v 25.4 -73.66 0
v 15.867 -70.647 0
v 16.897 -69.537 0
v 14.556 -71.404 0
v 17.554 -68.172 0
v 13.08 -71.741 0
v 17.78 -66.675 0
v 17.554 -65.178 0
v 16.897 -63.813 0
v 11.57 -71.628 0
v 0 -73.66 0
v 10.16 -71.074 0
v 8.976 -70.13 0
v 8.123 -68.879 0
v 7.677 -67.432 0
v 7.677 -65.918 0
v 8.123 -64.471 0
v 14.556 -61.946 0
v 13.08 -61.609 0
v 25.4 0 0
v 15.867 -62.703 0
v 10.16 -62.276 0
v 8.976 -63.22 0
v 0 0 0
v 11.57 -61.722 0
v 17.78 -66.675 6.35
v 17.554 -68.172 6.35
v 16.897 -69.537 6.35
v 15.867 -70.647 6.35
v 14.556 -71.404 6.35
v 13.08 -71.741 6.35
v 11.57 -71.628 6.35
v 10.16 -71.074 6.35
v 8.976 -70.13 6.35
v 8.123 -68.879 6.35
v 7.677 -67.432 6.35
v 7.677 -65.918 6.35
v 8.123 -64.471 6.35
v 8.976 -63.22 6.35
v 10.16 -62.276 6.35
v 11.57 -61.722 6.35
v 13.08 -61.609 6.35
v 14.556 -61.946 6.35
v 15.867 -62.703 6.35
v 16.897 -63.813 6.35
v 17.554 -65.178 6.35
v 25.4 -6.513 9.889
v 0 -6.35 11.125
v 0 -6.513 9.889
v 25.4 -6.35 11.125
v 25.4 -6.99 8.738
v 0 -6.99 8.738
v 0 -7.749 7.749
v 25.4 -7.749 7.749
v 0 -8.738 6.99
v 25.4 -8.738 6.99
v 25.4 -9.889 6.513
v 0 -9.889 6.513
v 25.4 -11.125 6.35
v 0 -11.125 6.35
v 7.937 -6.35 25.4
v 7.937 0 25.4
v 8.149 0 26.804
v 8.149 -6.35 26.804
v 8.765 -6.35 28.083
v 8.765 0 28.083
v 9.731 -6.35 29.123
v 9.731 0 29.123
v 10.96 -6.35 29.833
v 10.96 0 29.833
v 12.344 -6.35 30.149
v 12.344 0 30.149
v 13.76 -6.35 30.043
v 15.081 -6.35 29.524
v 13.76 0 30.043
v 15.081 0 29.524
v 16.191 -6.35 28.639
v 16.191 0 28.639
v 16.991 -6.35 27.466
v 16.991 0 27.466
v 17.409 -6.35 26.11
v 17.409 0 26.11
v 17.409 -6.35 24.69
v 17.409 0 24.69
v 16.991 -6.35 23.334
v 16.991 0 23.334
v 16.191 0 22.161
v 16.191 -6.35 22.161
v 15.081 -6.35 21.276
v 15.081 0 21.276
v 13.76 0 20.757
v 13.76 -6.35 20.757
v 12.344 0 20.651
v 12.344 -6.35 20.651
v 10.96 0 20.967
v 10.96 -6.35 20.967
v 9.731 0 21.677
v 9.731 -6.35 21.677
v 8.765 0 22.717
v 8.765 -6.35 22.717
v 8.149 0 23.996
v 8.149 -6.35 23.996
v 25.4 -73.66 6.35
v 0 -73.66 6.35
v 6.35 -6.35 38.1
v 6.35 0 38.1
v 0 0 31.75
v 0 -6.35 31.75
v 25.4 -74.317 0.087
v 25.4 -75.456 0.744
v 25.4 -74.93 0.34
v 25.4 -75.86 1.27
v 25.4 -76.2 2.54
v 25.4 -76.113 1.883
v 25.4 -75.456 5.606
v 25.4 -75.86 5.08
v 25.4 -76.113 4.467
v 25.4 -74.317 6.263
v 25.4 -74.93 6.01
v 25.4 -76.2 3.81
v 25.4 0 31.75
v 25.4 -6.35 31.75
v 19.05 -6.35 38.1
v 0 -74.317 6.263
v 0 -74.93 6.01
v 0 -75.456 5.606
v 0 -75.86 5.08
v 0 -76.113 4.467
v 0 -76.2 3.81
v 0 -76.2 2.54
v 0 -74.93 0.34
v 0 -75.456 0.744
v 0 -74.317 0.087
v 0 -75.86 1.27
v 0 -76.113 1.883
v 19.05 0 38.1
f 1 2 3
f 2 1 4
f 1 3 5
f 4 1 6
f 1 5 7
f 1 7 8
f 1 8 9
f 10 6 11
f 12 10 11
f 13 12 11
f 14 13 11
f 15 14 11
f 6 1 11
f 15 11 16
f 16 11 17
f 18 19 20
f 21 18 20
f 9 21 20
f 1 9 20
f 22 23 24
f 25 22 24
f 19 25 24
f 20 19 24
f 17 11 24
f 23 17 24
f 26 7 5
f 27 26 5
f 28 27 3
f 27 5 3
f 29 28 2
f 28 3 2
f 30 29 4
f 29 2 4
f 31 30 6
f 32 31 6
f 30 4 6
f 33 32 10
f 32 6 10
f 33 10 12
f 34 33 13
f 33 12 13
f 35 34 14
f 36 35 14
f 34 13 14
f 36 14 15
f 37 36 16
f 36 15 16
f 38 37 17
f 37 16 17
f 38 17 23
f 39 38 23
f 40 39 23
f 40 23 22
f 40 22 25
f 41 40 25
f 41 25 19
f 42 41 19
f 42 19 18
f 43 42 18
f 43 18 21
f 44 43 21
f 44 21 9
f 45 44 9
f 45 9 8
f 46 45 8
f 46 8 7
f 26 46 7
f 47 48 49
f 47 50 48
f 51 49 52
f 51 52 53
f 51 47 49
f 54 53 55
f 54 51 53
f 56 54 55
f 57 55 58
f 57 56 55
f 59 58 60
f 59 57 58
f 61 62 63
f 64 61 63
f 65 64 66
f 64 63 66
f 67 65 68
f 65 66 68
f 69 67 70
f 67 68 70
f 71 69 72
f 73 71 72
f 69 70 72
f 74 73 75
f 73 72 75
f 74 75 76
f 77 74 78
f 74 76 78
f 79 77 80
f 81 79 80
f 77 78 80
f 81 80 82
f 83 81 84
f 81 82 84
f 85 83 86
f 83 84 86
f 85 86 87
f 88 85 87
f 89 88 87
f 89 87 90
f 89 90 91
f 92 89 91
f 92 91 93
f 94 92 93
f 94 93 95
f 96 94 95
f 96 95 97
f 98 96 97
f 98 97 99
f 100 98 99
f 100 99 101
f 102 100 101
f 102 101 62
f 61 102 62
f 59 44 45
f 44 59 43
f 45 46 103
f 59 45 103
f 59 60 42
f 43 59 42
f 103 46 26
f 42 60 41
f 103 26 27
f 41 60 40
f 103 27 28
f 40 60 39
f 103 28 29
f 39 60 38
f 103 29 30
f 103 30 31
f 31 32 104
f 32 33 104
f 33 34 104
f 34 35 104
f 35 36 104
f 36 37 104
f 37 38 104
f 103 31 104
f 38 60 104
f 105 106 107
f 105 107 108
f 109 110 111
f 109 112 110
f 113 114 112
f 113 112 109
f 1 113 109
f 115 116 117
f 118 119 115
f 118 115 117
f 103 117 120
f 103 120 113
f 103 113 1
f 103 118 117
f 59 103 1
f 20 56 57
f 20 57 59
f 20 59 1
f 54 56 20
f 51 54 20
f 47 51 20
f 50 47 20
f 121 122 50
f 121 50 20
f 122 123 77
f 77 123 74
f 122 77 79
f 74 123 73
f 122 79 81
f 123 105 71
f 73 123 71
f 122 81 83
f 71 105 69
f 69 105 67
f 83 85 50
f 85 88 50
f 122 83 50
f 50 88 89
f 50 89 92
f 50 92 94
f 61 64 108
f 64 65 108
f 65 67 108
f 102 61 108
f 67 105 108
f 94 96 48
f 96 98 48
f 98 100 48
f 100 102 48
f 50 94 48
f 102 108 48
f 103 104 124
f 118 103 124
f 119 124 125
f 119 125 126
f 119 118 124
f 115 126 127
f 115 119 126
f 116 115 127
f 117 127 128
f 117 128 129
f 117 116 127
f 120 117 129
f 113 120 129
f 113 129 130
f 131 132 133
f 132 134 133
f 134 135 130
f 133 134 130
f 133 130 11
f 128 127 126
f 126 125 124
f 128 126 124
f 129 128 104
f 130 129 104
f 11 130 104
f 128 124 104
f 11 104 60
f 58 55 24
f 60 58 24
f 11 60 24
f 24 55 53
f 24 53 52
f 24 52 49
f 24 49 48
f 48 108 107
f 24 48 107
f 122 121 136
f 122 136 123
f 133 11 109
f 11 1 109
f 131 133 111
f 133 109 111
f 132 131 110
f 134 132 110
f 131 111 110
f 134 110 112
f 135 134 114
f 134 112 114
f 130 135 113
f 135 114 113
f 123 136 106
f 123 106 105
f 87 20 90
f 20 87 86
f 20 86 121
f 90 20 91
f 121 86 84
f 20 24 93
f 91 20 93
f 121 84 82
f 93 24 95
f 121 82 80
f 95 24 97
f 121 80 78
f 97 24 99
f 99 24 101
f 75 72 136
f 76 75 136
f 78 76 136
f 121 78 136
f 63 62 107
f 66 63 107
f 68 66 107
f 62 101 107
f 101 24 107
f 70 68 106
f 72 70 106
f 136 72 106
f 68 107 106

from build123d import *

# Parameters (mm, degrees)
F1_DEPTH = 25.4
F2_R     = 4.7752
F3_R     = 4.7625
F4_DEPTH = 25.4
F5_SIZE  = 6.35
F6_R     = 5.08
F7_DEPTH = 25.4
F8_R     = 2.54


with BuildPart() as f1:
    # F0 (on Right) → F1 (new body)
    with BuildSketch(Plane.YZ):
        Polygon((-76.2, 0), (0, 0), (0, 38.1), (-6.35, 38.1), (-6.35, 6.35), (-76.2, 6.35), align=None)
    extrude(amount=F1_DEPTH)

    # F2
    f2_edges = [f1.edges().sort_by_distance(p)[0] for p in [
        (12.7, -6.35, 6.35),
    ]]
    fillet(f2_edges, radius=F2_R)

    # F3 (on face) → F4 (cut)
    with BuildSketch(Plane(origin=(0, 0, 0), x_dir=(-1, 0, 0), z_dir=(0, 1, 0))):
        with Locations((-12.7, 25.4)):
            Circle(F3_R)
    extrude(amount=-F4_DEPTH, mode=Mode.SUBTRACT)

    # F5
    f5_edges = [f1.edges().sort_by_distance(p)[0] for p in [
        (25.4, -3.175, 38.1),
        (0, -3.175, 38.1),
    ]]
    chamfer(f5_edges, length=F5_SIZE)

    # F6 (on face) → F7 (cut)
    with BuildSketch(Plane(origin=(0, 0, 0), x_dir=(1, 0, 0), z_dir=(0, 0, -1))):
        with Locations((12.7, 66.675)):
            Circle(F6_R)
    extrude(amount=-F7_DEPTH, mode=Mode.SUBTRACT)

    # F8
    f8_edges = [f1.edges().sort_by_distance(p)[0] for p in [
        (12.7, -76.2, 0),
        (12.7, -76.2, 6.35),
    ]]
    fillet(f8_edges, radius=F8_R)


solid = f1.part
